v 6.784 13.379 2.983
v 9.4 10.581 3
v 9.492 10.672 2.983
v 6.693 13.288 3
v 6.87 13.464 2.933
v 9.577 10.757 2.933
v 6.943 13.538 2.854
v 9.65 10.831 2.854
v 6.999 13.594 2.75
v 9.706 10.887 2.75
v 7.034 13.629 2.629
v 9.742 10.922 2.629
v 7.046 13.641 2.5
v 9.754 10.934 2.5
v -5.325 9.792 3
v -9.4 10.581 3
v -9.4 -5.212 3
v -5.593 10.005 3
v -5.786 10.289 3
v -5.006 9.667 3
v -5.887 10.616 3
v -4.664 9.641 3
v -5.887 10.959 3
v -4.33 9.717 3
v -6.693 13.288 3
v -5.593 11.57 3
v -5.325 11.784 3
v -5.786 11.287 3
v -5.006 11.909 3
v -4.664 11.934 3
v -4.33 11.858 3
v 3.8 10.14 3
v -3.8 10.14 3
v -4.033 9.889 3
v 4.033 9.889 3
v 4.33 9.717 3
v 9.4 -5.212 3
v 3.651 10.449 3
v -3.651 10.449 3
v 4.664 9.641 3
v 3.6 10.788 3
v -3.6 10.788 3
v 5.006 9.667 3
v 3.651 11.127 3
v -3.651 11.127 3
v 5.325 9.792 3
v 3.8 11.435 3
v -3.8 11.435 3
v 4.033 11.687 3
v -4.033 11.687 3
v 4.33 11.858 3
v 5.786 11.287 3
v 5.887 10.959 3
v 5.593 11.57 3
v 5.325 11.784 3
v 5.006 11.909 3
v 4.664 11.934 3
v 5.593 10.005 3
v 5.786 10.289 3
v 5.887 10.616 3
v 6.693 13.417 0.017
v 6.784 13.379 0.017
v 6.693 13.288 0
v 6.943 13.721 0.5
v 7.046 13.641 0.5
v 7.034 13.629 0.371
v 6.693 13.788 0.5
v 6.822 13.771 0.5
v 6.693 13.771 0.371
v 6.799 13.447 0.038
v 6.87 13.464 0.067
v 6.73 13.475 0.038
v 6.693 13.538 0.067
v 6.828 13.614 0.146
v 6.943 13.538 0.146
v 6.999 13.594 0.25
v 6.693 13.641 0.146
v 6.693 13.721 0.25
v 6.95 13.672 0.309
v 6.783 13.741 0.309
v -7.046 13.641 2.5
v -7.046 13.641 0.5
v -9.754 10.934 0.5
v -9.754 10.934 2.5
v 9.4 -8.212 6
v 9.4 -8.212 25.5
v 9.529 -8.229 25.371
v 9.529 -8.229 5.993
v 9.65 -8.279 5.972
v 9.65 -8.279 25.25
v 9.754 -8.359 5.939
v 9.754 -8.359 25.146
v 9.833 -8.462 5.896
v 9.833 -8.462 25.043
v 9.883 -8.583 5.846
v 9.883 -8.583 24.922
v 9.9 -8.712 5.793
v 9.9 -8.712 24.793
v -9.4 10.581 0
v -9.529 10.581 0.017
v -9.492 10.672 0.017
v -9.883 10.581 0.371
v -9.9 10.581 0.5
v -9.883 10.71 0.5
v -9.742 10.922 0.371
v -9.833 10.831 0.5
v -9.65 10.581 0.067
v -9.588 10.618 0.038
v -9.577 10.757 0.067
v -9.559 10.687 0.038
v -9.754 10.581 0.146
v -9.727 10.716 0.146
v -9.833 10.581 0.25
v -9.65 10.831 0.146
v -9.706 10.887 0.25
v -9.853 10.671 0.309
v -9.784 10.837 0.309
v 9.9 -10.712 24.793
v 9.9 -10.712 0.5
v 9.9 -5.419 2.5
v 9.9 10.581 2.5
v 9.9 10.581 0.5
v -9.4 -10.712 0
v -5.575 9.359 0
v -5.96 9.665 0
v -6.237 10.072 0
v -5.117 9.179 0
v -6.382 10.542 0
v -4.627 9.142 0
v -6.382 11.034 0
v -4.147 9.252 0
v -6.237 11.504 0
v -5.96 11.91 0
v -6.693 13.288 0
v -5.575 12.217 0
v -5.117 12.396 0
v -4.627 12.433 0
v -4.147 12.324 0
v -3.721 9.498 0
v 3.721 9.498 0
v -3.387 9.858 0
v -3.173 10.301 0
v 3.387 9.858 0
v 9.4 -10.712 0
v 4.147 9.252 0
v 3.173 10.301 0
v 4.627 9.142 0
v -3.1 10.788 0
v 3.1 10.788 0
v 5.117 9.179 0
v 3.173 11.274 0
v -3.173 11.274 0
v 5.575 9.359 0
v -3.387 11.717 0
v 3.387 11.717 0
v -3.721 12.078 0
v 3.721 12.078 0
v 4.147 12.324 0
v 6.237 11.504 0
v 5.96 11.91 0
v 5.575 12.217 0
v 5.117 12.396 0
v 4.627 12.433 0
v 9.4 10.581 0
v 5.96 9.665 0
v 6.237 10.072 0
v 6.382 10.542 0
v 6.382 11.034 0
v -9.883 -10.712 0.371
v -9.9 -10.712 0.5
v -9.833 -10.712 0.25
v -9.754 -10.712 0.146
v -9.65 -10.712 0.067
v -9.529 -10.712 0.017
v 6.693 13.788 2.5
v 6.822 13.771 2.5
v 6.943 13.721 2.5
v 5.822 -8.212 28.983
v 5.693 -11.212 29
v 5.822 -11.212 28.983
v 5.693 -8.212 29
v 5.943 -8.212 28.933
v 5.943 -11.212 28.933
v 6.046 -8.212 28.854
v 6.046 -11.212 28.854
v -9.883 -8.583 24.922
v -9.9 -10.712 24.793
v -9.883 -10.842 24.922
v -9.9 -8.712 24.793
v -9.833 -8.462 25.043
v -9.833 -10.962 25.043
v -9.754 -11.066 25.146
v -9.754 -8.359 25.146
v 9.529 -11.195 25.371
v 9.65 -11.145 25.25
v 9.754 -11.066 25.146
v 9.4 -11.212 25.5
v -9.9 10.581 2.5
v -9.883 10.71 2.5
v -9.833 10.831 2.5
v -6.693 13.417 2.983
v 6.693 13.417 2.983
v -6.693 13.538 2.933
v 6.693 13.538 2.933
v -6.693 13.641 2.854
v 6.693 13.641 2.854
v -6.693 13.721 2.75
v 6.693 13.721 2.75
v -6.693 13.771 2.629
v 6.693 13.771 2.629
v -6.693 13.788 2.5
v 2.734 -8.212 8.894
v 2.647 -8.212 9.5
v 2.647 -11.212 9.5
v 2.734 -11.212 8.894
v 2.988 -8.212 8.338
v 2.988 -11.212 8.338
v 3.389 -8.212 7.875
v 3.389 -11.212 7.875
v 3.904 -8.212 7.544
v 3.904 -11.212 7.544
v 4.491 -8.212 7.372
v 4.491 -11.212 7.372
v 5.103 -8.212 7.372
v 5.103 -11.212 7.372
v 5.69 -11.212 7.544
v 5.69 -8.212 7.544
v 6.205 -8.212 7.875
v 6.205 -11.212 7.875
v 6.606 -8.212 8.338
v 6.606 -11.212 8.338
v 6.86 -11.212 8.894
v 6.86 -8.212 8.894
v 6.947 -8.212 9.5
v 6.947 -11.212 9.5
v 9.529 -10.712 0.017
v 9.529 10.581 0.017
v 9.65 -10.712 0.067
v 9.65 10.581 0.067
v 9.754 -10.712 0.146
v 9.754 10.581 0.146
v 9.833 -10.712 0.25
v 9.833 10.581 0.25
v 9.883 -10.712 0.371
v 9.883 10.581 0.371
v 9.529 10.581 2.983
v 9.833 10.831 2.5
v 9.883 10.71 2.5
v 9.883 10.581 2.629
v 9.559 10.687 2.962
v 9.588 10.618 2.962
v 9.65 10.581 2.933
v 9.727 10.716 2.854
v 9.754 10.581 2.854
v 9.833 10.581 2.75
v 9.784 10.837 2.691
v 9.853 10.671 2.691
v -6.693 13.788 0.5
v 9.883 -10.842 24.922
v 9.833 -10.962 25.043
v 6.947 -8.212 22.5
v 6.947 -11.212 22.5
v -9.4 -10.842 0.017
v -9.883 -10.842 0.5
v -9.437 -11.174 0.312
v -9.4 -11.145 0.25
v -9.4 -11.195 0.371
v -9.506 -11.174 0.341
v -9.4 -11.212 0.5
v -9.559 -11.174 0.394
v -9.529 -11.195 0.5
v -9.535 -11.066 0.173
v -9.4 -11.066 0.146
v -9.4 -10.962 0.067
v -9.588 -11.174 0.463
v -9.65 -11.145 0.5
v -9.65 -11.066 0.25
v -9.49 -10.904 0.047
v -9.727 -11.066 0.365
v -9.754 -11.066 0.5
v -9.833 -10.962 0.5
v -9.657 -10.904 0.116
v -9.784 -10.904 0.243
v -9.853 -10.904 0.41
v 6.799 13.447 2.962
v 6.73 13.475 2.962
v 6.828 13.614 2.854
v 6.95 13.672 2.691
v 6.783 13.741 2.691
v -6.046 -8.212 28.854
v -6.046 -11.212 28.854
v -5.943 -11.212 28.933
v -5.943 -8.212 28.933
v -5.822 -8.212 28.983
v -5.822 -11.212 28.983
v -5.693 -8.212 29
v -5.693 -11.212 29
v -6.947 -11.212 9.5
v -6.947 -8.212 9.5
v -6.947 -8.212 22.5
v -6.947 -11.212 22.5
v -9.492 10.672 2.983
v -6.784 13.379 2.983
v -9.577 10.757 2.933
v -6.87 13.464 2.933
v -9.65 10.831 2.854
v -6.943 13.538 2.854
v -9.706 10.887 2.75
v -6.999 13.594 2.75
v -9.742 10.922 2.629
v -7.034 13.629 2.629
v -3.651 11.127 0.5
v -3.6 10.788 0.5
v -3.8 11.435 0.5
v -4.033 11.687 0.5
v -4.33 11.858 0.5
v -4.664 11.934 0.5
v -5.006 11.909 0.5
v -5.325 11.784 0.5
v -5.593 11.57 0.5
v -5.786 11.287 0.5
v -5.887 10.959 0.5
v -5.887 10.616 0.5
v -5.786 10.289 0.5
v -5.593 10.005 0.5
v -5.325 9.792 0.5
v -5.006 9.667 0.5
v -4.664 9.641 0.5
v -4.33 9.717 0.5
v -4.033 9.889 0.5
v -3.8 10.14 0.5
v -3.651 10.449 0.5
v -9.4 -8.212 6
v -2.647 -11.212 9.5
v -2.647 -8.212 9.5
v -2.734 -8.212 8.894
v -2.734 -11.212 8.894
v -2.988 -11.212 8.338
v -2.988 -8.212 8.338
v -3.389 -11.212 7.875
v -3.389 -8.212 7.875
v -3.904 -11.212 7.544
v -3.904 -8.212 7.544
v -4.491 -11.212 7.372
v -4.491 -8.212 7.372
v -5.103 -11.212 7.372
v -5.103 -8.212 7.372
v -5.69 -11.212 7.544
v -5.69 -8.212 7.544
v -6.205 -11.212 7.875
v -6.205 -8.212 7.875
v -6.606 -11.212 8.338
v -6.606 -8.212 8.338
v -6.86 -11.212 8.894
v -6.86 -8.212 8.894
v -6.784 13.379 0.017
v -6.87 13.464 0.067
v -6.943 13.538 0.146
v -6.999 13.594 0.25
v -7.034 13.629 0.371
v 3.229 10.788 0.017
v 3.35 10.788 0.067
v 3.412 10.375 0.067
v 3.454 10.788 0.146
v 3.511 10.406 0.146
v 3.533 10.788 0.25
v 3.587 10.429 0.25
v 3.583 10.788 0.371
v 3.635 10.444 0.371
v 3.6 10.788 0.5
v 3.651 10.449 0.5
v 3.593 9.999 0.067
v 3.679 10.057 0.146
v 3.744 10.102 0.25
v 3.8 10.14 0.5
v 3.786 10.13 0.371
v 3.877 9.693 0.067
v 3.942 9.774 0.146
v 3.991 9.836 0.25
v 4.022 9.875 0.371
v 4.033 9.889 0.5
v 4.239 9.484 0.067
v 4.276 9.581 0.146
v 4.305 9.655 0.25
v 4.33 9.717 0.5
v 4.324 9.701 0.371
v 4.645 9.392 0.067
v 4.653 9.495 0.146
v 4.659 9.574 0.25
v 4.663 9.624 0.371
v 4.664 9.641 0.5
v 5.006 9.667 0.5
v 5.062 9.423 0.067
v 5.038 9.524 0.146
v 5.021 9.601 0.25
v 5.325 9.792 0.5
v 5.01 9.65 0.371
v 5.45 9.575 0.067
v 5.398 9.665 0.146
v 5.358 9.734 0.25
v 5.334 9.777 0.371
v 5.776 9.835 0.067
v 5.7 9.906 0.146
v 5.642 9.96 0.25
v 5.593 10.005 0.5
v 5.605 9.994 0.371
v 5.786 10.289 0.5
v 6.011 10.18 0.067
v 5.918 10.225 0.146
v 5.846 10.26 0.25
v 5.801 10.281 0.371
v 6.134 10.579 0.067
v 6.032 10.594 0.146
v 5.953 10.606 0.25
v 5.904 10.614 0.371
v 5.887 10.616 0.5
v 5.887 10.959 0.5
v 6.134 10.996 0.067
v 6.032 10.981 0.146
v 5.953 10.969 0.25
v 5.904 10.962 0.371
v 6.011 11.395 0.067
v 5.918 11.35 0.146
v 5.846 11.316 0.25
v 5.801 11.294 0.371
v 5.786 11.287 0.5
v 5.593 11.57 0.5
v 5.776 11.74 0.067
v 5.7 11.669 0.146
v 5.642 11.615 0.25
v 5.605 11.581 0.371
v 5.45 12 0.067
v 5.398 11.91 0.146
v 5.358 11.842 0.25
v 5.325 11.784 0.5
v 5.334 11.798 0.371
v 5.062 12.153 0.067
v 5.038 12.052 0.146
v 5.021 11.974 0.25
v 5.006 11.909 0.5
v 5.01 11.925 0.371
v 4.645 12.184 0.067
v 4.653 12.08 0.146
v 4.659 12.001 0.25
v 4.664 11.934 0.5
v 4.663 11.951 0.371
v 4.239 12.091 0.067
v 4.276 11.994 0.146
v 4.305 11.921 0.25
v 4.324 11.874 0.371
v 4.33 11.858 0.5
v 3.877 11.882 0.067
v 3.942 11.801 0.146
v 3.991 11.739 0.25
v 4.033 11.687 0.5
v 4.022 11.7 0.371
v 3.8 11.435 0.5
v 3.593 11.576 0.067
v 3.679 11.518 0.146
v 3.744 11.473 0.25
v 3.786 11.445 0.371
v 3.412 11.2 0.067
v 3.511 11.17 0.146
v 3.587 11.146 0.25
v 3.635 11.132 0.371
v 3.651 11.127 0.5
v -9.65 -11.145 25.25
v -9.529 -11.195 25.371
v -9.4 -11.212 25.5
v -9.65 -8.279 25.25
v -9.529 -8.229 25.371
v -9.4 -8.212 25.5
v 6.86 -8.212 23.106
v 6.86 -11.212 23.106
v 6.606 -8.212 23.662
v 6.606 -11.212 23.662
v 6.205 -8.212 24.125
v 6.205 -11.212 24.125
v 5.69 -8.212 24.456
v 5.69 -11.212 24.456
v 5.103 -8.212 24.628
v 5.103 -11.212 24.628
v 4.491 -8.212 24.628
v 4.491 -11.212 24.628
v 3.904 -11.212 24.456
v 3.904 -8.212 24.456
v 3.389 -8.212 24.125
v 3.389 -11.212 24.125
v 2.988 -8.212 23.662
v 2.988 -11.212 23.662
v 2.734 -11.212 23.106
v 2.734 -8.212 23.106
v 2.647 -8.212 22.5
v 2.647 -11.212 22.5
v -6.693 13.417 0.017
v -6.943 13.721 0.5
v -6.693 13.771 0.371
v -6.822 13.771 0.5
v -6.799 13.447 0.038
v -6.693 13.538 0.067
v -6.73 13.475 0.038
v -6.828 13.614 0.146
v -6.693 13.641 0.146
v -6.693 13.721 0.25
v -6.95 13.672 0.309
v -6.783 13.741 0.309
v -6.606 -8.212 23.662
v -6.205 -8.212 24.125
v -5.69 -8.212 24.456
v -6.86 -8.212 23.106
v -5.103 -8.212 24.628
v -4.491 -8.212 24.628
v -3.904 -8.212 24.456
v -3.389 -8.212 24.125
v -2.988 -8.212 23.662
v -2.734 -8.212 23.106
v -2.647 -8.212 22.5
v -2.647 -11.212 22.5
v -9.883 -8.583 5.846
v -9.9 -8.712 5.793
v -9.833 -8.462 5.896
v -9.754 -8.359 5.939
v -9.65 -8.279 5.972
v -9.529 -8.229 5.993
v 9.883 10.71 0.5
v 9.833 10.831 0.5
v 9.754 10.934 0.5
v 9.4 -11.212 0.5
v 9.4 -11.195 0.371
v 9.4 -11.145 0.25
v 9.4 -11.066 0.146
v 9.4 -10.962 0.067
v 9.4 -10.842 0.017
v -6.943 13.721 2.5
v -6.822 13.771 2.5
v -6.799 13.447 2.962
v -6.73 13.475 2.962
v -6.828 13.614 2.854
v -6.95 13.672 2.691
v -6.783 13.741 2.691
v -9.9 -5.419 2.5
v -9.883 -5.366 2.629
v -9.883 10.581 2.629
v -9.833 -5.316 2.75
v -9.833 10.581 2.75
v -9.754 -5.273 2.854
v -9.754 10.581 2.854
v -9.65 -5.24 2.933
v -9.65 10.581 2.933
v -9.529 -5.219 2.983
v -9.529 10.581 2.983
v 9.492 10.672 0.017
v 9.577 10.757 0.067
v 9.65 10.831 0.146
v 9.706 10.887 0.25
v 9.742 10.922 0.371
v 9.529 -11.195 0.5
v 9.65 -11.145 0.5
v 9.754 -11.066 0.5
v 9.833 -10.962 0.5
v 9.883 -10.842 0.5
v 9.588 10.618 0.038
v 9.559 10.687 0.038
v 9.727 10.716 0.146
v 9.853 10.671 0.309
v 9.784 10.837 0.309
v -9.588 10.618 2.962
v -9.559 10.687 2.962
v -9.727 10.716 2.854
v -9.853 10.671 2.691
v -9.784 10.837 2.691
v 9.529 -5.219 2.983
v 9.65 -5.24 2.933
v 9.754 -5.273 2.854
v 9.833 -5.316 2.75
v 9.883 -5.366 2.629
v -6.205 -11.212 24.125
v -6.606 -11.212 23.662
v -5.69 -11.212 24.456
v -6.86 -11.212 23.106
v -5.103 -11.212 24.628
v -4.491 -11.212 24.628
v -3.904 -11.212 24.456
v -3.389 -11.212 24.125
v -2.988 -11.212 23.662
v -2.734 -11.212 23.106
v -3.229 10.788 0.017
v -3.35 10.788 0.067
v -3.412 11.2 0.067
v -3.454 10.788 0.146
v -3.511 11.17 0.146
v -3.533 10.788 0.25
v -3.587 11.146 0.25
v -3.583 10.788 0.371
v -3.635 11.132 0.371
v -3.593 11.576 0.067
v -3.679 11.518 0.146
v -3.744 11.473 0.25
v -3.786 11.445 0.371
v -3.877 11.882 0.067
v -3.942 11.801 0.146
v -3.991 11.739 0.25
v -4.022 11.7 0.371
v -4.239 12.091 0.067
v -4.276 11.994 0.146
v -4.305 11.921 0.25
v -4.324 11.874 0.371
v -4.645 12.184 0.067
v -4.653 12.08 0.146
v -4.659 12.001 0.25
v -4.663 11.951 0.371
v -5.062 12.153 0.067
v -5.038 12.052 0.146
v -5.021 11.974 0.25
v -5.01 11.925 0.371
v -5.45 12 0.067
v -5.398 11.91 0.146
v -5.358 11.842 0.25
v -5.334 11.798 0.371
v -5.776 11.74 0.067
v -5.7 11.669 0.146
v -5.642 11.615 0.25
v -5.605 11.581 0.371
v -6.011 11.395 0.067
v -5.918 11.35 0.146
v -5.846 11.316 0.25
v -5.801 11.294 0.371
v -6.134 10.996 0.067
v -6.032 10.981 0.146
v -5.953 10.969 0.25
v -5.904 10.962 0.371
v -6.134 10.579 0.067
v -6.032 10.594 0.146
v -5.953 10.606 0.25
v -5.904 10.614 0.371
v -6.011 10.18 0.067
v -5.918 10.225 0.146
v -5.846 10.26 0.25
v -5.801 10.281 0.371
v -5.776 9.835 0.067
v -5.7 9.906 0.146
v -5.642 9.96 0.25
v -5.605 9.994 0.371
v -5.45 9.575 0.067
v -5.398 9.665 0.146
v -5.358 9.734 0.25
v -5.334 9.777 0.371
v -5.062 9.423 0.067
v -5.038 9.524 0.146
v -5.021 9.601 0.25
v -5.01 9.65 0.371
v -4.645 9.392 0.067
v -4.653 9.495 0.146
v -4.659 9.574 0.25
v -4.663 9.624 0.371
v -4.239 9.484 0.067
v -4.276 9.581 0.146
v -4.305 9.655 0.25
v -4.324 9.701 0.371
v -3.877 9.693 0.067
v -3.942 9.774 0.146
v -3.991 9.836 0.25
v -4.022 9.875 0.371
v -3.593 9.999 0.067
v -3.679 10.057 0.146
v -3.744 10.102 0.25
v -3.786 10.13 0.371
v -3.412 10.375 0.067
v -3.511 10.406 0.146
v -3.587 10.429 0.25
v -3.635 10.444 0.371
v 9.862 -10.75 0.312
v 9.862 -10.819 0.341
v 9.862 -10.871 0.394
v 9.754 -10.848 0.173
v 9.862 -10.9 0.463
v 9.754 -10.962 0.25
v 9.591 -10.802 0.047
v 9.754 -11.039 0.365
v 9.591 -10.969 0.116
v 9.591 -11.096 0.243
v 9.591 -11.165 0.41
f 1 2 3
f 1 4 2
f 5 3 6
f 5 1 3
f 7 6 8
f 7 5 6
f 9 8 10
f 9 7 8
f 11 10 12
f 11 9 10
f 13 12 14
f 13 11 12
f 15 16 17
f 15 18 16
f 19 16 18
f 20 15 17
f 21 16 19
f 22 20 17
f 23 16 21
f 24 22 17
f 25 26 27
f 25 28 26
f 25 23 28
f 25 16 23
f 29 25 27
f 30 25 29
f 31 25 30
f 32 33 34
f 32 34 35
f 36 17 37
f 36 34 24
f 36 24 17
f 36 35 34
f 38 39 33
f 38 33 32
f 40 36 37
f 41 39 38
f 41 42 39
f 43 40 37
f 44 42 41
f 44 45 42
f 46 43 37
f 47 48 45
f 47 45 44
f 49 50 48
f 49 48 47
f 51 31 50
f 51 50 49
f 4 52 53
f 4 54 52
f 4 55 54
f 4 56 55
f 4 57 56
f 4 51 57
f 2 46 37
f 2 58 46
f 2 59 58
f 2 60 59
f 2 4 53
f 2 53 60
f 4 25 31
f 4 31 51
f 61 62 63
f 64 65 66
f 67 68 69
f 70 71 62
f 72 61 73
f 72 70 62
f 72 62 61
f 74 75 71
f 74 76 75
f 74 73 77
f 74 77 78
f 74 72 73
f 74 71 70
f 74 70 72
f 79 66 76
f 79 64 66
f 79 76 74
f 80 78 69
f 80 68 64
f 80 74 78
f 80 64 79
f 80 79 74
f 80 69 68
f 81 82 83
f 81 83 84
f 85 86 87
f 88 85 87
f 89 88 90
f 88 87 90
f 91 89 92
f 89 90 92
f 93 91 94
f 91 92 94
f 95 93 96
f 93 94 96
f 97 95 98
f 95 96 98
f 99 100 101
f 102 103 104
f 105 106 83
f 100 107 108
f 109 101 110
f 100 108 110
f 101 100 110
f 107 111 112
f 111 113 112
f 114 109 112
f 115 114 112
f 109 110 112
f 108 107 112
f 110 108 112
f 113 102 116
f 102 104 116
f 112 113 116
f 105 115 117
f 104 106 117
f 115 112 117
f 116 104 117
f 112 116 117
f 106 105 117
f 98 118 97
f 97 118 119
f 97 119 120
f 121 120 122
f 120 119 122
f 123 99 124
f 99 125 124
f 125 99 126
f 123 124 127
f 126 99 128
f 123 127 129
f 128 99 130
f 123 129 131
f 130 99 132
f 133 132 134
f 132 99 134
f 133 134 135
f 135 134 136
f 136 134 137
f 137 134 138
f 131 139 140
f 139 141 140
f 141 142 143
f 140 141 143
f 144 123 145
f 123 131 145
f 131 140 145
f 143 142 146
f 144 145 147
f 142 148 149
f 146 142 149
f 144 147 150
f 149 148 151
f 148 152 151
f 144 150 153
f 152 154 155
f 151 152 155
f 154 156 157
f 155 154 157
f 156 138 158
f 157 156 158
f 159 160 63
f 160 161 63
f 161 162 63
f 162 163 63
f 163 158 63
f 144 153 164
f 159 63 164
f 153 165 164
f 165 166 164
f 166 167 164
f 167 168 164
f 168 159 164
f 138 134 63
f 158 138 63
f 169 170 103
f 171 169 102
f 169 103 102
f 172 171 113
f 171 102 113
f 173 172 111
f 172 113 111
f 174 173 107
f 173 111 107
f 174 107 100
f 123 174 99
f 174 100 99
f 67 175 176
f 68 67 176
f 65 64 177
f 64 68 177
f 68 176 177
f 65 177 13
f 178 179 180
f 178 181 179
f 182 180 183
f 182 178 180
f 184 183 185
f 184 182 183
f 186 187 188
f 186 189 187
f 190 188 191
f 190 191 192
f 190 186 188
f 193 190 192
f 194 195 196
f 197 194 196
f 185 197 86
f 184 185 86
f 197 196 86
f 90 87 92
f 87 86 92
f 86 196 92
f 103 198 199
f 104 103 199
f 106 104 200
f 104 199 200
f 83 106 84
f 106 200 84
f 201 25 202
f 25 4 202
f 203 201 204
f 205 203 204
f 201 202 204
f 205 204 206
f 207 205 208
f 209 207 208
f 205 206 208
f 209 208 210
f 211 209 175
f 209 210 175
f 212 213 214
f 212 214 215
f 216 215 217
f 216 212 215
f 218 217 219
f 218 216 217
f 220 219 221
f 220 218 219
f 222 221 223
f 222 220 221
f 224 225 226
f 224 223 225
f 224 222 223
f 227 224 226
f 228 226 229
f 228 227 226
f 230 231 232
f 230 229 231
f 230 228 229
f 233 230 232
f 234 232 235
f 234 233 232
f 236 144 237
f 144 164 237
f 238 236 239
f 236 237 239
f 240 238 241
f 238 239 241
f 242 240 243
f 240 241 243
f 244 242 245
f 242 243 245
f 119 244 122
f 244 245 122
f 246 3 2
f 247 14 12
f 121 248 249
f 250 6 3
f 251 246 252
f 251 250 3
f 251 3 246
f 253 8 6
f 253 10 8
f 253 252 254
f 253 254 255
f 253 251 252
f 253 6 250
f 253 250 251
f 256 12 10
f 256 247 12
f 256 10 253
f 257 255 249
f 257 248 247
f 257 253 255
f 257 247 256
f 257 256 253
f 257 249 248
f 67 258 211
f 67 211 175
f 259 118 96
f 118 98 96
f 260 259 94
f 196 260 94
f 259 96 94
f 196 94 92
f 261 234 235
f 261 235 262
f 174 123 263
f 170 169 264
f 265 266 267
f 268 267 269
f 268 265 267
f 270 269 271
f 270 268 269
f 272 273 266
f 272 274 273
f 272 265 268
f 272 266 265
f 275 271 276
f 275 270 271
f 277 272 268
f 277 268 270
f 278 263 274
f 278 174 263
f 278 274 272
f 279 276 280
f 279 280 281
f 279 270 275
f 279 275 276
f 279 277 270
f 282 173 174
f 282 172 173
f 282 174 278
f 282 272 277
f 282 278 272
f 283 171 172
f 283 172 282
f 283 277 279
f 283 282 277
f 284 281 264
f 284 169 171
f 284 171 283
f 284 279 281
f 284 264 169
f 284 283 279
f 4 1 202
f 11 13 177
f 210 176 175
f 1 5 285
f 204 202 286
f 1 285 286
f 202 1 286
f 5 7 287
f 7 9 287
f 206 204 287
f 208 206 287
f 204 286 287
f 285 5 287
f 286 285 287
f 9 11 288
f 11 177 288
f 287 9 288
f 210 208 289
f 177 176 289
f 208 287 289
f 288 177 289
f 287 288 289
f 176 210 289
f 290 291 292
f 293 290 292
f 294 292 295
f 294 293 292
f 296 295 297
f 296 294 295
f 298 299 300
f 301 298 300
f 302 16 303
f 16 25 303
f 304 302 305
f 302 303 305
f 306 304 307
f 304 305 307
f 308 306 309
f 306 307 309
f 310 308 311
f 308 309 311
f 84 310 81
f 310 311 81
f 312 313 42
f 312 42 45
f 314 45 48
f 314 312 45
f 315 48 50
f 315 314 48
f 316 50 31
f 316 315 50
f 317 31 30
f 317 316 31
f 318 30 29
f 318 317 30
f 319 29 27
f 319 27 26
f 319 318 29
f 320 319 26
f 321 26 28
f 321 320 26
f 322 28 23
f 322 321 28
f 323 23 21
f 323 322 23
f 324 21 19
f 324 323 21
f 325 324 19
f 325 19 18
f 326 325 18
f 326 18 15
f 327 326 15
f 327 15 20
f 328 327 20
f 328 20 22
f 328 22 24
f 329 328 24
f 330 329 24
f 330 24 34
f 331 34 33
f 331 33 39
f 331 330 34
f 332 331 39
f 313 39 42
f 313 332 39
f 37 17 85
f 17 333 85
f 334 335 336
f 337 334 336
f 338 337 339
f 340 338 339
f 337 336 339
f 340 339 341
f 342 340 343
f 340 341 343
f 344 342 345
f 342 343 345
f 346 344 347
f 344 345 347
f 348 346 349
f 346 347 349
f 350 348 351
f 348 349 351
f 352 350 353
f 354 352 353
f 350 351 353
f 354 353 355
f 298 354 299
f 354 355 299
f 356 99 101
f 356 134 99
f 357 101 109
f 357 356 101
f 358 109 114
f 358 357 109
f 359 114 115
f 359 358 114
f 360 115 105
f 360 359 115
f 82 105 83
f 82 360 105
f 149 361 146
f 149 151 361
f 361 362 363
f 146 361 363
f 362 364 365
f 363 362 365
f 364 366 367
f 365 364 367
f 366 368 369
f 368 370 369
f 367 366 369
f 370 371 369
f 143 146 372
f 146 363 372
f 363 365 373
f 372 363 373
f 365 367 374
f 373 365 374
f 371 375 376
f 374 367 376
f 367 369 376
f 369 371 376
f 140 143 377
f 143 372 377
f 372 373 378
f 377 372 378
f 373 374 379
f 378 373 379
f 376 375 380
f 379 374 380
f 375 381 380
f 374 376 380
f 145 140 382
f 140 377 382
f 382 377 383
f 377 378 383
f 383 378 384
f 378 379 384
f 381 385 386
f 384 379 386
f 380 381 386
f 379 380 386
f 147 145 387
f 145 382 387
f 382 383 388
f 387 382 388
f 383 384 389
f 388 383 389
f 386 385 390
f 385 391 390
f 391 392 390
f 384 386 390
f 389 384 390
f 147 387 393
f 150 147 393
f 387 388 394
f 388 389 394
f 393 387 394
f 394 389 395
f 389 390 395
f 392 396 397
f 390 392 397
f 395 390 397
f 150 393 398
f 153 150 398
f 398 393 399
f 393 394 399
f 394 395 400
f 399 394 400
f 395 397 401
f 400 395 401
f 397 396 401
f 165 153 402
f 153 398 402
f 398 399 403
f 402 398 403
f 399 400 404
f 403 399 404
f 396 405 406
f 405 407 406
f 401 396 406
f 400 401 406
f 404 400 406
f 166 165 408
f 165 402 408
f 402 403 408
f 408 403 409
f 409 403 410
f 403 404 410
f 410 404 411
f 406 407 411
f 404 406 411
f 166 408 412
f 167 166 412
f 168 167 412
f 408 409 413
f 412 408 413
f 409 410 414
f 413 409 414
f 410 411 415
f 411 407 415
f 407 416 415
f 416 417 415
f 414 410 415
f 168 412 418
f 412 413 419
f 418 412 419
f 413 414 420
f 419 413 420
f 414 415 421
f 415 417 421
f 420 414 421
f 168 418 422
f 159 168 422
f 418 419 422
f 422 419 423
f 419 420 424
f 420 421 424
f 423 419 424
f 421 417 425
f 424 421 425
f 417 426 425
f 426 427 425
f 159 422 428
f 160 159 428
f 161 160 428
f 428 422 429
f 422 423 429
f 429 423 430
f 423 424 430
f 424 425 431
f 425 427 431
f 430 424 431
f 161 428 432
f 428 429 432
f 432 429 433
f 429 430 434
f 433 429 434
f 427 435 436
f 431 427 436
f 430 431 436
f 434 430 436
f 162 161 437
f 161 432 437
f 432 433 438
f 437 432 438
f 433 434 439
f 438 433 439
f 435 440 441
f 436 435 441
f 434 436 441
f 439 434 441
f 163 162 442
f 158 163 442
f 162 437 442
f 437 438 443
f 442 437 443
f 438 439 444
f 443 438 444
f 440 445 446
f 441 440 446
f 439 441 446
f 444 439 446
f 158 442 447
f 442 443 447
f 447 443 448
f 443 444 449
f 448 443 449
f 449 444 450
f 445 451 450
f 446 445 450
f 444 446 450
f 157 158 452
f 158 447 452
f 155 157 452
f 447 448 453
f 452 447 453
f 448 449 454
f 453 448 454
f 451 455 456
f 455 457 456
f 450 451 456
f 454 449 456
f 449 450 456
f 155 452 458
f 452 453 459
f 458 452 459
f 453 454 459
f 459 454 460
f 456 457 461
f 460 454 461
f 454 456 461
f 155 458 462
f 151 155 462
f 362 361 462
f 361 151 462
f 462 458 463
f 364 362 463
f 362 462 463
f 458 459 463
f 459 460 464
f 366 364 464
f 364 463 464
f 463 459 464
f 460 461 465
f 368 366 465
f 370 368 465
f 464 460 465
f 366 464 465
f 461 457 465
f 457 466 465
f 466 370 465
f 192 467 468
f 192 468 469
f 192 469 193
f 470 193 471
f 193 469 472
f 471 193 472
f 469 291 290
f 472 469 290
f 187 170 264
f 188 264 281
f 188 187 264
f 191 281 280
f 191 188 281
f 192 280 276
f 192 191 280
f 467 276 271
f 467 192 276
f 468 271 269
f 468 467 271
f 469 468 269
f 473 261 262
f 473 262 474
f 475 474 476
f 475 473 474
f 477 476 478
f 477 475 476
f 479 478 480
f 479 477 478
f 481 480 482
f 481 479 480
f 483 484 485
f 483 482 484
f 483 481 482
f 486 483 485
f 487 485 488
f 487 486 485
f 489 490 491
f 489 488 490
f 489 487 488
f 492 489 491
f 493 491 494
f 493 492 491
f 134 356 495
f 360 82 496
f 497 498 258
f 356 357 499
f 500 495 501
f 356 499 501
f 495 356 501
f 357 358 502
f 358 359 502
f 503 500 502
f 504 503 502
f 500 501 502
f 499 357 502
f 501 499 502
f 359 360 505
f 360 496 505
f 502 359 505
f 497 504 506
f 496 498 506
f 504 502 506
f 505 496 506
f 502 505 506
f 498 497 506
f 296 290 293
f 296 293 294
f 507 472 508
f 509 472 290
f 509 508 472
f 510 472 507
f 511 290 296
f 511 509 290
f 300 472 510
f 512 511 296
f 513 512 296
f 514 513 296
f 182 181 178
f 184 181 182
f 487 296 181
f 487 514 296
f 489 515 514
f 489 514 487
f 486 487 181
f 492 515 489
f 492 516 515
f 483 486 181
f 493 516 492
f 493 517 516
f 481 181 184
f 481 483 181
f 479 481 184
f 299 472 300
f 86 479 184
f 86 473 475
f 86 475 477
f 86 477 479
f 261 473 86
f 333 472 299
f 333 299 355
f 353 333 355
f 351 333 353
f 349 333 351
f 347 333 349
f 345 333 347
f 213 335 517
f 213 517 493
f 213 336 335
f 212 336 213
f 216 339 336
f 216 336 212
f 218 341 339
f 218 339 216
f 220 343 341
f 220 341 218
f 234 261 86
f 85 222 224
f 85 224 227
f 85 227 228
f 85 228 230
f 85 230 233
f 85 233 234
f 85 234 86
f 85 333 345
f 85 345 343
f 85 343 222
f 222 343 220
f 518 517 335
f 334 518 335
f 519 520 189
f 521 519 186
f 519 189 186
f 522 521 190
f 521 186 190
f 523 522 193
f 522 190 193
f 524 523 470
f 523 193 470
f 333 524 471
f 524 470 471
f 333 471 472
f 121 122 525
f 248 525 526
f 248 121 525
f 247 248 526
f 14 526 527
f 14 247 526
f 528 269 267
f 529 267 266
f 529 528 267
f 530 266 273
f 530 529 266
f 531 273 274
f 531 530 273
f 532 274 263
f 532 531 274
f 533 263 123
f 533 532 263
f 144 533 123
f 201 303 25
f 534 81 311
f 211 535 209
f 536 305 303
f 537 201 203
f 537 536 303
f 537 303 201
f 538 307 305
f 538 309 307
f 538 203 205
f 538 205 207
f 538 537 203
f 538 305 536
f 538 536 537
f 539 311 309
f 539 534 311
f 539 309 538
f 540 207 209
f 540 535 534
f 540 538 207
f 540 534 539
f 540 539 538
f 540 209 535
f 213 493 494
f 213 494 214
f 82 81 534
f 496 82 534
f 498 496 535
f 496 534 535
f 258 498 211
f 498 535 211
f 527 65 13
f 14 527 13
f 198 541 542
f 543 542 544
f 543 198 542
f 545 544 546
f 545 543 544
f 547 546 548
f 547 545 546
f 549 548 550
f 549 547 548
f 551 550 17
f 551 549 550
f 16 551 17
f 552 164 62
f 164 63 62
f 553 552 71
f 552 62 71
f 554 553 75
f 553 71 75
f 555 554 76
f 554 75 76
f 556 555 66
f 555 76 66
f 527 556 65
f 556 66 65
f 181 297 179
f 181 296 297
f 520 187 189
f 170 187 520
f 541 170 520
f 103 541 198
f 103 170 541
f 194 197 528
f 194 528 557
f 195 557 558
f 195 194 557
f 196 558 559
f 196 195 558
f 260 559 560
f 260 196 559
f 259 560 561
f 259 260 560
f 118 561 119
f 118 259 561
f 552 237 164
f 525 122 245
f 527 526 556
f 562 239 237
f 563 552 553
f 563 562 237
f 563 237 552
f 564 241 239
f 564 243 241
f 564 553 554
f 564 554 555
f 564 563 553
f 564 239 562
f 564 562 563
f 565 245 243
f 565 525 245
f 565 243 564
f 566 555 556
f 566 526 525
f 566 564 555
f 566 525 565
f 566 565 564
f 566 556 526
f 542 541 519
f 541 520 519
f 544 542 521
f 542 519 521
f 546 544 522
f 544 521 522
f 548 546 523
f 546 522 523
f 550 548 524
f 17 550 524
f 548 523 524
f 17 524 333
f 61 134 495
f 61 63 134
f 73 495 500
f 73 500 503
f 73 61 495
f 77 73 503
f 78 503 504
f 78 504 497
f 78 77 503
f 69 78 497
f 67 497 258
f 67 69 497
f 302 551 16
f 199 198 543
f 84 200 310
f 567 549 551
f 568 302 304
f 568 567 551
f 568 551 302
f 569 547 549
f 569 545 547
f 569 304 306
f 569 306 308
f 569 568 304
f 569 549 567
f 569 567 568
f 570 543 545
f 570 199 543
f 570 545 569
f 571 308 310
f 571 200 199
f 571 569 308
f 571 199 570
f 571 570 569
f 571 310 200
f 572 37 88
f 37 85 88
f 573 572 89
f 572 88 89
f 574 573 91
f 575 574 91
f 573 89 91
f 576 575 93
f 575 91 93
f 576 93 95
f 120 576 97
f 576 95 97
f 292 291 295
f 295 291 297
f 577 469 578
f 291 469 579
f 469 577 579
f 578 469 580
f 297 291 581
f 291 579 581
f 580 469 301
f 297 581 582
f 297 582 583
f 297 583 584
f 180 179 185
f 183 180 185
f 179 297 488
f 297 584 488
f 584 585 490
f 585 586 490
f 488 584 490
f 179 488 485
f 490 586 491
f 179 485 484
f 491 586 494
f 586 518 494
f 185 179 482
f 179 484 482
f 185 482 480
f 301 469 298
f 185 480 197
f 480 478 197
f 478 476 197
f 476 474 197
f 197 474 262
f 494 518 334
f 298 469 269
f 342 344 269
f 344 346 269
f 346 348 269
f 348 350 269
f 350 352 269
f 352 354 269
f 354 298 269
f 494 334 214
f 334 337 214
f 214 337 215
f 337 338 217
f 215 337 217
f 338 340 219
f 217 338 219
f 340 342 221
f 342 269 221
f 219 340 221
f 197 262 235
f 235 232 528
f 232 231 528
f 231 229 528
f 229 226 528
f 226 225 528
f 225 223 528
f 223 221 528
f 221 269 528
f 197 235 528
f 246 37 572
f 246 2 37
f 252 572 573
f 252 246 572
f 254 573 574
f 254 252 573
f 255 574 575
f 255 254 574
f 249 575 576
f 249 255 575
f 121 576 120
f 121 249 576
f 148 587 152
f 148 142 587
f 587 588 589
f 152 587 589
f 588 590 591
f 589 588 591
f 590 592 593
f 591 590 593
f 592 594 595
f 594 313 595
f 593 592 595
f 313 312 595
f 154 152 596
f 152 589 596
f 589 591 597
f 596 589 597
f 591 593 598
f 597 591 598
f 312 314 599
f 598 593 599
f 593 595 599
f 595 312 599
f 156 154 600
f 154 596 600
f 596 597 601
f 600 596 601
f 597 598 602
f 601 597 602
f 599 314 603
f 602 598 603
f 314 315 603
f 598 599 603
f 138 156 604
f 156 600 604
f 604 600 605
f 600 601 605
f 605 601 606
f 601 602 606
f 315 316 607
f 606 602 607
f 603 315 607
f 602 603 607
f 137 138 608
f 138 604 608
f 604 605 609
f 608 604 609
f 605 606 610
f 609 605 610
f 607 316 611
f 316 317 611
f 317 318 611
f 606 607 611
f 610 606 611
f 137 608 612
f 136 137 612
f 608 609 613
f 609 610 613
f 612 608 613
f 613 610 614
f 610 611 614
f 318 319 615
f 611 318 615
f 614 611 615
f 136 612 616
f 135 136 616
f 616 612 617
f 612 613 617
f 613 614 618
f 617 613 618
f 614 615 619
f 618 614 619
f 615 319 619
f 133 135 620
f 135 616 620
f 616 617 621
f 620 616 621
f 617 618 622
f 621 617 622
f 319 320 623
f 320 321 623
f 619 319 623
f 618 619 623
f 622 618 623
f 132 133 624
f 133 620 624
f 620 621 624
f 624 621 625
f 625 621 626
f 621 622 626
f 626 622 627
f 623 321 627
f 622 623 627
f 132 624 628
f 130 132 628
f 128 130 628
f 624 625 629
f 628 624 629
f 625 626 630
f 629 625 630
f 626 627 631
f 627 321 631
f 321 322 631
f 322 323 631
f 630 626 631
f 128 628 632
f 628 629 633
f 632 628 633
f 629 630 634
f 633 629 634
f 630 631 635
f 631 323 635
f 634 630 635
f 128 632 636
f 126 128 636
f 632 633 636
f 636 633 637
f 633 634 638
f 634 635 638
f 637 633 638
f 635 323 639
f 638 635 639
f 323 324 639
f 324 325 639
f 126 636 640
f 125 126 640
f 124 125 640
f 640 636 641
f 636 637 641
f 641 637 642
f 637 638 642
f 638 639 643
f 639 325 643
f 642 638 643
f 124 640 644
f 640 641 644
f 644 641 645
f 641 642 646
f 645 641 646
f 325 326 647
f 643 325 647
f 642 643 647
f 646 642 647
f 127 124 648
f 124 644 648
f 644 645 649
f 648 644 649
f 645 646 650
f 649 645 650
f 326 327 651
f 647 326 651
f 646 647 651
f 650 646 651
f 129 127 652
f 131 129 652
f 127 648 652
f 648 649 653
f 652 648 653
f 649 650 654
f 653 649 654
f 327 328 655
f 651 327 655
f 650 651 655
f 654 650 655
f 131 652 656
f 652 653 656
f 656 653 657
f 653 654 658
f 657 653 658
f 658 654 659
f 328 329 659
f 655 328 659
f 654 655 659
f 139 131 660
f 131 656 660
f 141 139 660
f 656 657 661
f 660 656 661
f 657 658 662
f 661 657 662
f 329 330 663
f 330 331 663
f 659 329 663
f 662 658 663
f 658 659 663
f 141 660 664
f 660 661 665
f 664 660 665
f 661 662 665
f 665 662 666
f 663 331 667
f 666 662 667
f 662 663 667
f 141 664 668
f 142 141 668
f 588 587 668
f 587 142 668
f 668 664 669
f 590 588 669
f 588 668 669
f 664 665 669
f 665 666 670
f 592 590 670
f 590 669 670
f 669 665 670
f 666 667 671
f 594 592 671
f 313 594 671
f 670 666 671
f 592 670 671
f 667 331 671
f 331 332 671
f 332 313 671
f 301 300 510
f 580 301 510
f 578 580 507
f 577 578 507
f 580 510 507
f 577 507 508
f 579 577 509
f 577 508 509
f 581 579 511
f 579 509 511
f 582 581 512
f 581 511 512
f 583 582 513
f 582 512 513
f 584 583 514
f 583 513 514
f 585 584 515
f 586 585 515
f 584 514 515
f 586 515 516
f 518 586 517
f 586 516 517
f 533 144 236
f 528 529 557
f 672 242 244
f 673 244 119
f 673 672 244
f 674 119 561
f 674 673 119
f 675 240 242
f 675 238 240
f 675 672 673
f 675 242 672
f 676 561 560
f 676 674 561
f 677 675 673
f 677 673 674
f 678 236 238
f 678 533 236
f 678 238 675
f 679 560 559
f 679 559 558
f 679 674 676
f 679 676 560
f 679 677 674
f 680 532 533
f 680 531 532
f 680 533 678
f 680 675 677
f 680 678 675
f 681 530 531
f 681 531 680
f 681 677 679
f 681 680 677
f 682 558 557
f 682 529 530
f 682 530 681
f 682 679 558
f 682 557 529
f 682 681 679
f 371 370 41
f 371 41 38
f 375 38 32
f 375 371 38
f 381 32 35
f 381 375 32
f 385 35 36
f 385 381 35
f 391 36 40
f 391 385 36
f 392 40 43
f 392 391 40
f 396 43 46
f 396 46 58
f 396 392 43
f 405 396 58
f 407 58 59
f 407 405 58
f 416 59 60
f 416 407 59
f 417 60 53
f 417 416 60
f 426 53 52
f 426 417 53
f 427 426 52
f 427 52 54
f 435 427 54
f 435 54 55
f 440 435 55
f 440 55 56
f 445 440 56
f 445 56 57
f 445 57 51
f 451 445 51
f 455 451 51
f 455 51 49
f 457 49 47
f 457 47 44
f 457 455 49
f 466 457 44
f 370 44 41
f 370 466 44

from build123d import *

# Parameters (mm, degrees)
SKETCH1_W           = 19.8
SKETCH1_H           = 25
SKETCH1_R           = 1.15
BOSS_EXTRUDE1_DEPTH = 3
SKETCH2_W           = 19.8
SKETCH2_H           = 3
BOSS_EXTRUDE2_DEPTH = 26
CHAMFER1_SIZE       = 3
CUT_EXTRUDE1_DEPTH  = 15
CHAMFER2_SIZE       = 4
FILLET2_R           = 0.5


with BuildPart() as part:
    # Sketch1 → Boss-Extrude1 (new body)
    with BuildSketch(Plane.XY):
        with Locations((0, 1.287671233)):
            Rectangle(SKETCH1_W, SKETCH1_H)
        with Locations((-4.75, 10.787671233)):
            Circle(SKETCH1_R, mode=Mode.SUBTRACT)
        with Locations(Location((4.75, 10.787671233, 0), (0, 0, 180))):
            Circle(SKETCH1_R, mode=Mode.SUBTRACT)
    extrude(amount=BOSS_EXTRUDE1_DEPTH)

    # Sketch2 → Boss-Extrude2 (add)
    with BuildSketch(Plane.XY.offset(3)):
        with Locations((0, -9.712328767)):
            Rectangle(SKETCH2_W, SKETCH2_H)
    extrude(amount=BOSS_EXTRUDE2_DEPTH)

    # Chamfer1
    chamfer1_edges = [part.edges().sort_by_distance(p)[0] for p in [
        (0, -8.212328767, 3),
        (-9.9, 13.787671233, 1.5),
        (9.9, 13.787671233, 1.5),
    ]]
    chamfer(chamfer1_edges, length=CHAMFER1_SIZE)

    # Sketch4 → Cut-Extrude1 (cut)
    with BuildSketch(Plane(origin=(0, -8.212328767, 0), x_dir=(1, 0, 0), z_dir=(0, 1, 0))):
        with BuildLine():
            Line((2.647058824, -22.5), (2.647058824, -9.5))
            ThreePointArc((2.647058824, -9.5), (4.797058824, -7.35), (6.947058824, -9.5))
            Line((6.947058824, -9.5), (6.947058824, -22.5))
            ThreePointArc((6.947058824, -22.5), (4.797058824, -24.65), (2.647058824, -22.5))
        make_face()
        with BuildLine():
            Line((-2.647058824, -22.5), (-2.647058824, -9.5))
            ThreePointArc((-2.647058824, -9.5), (-4.797058824, -7.35), (-6.947058824, -9.5))
            Line((-6.947058824, -9.5), (-6.947058824, -22.5))
            ThreePointArc((-6.947058824, -22.5), (-4.797058824, -24.65), (-2.647058824, -22.5))
        make_face()
    extrude(amount=-CUT_EXTRUDE1_DEPTH, mode=Mode.SUBTRACT)

    # Chamfer2
    chamfer2_edges = [part.edges().sort_by_distance(p)[0] for p in [
        (-9.9, -9.712328767, 29),
        (9.9, -9.712328767, 29),
    ]]
    chamfer(chamfer2_edges, length=CHAMFER2_SIZE)

    # Fillet2
    fillet2_edges = [part.edges().sort_by_distance(p)[0] for p in [
        (-5.9, 10.787671233, 0),
        (5.9, 10.787671233, 0),
        (0, 13.787671233, 0),
        (0, 13.787671233, 3),
        (-6.9, 13.787671233, 1.5),
        (6.9, 13.787671233, 1.5),
        (-9.9, -0.212328767, 0),
        (-8.4, 12.287671233, 0),
        (8.4, 12.287671233, 0),
        (9.9, 2.787671233, 3),
        (9.9, 10.787671233, 1.5),
        (-9.9, 2.787671233, 3),
        (-8.4, 12.287671233, 3),
        (8.4, 12.287671233, 3),
        (-9.9, 10.787671233, 1.5),
        (-9.9, -6.712328767, 4.5),
        (9.9, -6.712328767, 4.5),
        (0, -11.212328767, 0),
        (9.9, -0.212328767, 0),
        (-5.9, -9.712328767, 29),
        (5.9, -9.712328767, 29),
        (9.9, -8.212328767, 15.5),
        (-9.9, -8.212328767, 15.5),
        (9.9, -11.212328767, 12.5),
        (9.9, -9.712328767, 25),
        (-9.9, -11.212328767, 12.5),
        (-9.9, -9.712328767, 25),
    ]]
    fillet(fillet2_edges, radius=FILLET2_R)


solid = part.part
